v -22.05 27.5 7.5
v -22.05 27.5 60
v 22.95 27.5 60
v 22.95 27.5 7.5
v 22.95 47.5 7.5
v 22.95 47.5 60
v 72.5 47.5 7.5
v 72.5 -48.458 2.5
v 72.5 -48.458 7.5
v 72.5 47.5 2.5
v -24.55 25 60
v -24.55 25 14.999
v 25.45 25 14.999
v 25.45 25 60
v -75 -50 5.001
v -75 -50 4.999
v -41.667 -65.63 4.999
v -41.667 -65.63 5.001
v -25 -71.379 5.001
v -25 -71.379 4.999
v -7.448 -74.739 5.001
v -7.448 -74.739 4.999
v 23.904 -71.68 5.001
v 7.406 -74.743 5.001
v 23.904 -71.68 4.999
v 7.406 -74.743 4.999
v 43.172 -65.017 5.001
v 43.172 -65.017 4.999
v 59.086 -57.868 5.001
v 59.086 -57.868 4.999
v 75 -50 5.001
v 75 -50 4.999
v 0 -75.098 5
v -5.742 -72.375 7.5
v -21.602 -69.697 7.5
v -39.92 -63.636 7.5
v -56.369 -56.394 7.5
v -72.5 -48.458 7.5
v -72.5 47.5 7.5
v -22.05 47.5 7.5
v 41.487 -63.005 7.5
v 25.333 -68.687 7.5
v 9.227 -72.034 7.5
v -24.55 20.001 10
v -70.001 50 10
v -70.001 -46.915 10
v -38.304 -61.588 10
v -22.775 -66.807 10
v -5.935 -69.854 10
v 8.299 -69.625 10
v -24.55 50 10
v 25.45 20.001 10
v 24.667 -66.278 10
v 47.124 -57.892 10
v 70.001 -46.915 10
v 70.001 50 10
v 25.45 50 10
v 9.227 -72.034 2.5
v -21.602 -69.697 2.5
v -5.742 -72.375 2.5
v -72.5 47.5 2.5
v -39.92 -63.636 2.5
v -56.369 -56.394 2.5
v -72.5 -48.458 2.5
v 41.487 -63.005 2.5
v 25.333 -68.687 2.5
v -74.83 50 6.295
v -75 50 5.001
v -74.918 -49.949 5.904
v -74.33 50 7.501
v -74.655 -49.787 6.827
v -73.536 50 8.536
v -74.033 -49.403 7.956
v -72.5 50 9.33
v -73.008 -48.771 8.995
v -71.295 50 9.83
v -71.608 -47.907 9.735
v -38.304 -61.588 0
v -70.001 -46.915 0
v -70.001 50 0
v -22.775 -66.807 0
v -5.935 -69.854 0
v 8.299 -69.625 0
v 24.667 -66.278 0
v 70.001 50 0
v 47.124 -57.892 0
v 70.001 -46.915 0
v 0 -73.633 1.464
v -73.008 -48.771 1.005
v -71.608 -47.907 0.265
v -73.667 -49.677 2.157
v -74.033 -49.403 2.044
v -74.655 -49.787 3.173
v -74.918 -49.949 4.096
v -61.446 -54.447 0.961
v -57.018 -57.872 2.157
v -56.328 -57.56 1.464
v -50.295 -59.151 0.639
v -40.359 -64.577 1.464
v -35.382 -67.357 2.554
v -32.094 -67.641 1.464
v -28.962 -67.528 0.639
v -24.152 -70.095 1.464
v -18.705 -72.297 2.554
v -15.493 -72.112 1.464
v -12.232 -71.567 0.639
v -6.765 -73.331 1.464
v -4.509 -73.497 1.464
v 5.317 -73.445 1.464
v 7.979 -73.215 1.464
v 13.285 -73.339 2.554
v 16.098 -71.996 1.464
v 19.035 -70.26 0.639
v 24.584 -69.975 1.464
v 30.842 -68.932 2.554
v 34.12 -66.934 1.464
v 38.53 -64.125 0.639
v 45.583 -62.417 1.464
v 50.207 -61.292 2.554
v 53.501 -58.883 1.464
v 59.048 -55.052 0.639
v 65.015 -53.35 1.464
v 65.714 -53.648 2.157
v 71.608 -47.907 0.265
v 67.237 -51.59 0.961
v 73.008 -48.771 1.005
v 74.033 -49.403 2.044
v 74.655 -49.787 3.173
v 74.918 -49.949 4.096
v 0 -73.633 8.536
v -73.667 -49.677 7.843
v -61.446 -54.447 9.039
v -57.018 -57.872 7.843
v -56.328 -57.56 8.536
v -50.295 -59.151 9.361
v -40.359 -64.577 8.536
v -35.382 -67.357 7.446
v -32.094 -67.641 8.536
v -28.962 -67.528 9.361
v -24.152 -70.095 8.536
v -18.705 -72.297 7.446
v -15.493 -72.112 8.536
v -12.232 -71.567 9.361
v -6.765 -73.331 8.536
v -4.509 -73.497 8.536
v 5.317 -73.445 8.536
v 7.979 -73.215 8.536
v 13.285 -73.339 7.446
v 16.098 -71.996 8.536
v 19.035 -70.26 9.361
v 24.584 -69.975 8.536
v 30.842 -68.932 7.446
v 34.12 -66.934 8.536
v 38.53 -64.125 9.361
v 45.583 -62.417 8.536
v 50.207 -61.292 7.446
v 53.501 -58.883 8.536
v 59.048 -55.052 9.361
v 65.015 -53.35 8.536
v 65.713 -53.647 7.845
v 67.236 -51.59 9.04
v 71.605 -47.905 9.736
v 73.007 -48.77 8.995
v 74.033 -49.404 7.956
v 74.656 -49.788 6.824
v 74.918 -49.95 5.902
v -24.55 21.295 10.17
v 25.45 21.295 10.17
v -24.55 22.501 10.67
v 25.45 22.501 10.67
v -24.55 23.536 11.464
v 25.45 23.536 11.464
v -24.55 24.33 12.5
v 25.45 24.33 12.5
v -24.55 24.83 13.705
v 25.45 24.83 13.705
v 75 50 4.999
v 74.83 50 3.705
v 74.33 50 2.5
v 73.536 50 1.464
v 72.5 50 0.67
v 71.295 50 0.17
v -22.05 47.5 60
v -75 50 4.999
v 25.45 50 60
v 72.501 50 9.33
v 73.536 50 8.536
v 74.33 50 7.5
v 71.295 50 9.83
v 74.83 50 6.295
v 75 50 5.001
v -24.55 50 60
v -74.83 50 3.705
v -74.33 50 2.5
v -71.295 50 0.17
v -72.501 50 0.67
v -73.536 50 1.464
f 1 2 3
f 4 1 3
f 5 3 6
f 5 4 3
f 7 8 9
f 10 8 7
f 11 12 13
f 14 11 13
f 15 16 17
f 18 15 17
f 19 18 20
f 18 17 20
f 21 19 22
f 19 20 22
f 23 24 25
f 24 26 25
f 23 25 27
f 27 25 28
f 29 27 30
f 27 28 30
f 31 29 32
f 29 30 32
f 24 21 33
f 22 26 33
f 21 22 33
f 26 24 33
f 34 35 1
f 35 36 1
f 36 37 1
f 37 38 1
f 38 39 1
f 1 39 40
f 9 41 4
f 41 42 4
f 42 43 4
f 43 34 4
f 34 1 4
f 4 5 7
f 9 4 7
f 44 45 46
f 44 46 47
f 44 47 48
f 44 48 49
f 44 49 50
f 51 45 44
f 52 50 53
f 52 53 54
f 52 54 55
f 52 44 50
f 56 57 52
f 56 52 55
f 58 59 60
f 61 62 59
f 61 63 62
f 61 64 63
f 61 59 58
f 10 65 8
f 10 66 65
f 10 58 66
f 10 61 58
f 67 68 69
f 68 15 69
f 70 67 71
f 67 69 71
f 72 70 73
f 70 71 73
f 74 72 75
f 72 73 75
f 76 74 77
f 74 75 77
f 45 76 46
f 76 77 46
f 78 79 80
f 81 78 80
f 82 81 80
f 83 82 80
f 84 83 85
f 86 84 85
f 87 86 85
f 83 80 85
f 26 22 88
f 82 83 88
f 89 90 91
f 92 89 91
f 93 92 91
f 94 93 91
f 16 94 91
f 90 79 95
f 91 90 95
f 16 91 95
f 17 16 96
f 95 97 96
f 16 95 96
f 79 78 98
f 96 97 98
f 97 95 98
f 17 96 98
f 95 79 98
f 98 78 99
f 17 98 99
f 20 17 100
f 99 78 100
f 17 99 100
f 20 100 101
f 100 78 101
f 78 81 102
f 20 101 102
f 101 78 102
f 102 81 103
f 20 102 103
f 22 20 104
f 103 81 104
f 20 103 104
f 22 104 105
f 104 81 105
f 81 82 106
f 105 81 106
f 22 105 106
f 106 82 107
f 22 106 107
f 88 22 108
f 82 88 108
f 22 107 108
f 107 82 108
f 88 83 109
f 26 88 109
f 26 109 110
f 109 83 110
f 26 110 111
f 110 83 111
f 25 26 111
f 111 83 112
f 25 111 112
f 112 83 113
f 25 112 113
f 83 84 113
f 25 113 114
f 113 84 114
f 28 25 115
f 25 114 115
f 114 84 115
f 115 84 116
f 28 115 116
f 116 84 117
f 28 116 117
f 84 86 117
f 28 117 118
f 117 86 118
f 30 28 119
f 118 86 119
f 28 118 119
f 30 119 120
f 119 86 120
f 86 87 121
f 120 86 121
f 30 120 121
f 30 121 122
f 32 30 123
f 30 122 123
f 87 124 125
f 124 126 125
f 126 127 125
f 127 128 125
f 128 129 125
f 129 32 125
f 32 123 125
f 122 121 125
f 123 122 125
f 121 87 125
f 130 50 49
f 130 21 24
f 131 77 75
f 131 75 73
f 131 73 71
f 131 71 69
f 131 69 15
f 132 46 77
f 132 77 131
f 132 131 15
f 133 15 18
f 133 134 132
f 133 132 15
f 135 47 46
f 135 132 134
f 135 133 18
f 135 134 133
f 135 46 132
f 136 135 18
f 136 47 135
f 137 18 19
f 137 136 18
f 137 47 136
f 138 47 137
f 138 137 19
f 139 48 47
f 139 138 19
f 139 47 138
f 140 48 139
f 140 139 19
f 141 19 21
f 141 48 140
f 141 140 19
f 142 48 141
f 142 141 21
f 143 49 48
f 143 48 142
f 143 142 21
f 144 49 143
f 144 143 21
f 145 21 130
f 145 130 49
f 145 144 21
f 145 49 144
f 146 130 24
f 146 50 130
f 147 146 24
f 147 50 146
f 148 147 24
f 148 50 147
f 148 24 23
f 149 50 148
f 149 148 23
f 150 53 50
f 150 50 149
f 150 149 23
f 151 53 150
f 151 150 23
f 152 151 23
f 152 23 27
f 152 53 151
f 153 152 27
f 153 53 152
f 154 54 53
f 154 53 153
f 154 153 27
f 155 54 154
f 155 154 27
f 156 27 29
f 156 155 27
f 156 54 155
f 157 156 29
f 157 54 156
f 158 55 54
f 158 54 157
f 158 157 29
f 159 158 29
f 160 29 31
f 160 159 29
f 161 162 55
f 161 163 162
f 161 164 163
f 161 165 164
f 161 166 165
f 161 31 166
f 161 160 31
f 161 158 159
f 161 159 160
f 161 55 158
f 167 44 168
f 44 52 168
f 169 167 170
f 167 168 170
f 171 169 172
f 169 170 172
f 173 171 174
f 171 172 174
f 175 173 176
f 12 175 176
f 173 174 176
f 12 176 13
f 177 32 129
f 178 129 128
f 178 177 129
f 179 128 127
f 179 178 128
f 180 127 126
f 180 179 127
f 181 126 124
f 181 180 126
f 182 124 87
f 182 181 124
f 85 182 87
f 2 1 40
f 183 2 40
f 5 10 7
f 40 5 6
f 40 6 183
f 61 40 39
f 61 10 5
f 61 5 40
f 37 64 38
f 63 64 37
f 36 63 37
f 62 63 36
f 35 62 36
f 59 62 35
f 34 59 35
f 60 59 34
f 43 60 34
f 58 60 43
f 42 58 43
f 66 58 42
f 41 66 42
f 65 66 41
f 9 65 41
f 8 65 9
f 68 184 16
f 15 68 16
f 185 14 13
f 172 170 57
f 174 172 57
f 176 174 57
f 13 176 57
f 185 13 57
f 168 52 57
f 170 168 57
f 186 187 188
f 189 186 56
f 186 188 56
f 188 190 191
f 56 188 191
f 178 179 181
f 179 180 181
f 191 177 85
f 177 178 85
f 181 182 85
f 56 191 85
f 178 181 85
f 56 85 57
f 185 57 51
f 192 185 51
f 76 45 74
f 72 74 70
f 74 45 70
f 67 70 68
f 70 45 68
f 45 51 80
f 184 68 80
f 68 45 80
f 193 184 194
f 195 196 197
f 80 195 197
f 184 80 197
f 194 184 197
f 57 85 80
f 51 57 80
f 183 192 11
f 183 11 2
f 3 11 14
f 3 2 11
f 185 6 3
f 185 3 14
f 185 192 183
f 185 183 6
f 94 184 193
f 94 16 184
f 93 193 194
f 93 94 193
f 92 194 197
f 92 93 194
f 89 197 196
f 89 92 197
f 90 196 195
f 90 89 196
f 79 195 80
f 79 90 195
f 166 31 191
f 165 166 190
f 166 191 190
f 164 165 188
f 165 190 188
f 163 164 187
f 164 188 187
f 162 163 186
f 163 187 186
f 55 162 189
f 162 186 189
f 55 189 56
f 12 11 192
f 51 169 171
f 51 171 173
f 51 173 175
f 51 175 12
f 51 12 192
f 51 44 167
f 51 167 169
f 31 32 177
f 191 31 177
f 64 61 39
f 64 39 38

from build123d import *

# Parameters (mm, degrees)
F1_DEPTH = 10
F2_W     = 50
F2_H     = 25
F3_DEPTH = 50
F4_T     = -2.5
F5_R     = 4.999


# Not quite as in the source:
# - a fillet or chamfer is up to 0.001 mm smaller than in the source, because OpenCascade refuses the exact size


with BuildPart() as f1:
    # F0 (on Top) → F1 (new body)
    with BuildSketch(Plane.XY):
        with BuildLine():
            Line((75, 50), (-75, 50))
            Line((-75, 50), (-75, -50))
            add(Edge.make_bspline(
                [(-75, -50), (-50, -62.5487543643), (0, -87.6462630928), (50, -62.5487543643), (75, -50)],
                knots=[0, 0, 0, 0, 0.5, 1, 1, 1, 1], degree=3))
            Line((75, -50), (75, 50))
        make_face()
    extrude(amount=F1_DEPTH)

    # F2 (on face) → F3 (join)
    with BuildSketch(Plane.XY.offset(10)):
        with Locations((0.4496160895, 37.5)):
            Rectangle(F2_W, F2_H)
    extrude(amount=F3_DEPTH)

    # F4
    f4_openings = [f1.faces().sort_by_distance(p)[0] for p in [
        (0.449616, 37.5, 60),
    ]]
    offset(amount=F4_T, openings=f4_openings, kind=Kind.INTERSECTION)

    # F5 (radius 5 in the source; OpenCascade refuses exactly that, so slightly less here)
    f5_edges = [f1.edges().sort_by_distance(p)[0] for p in [
        (0, -75.097509, 10),
        (0, -75.097509, 0),
        (-75, 0, 10),
        (-75, 0, 0),
        (75, 0, 0),
        (75, 0, 10),
        (0.449616, 25, 10),
    ]]
    fillet(f5_edges, radius=F5_R)


solid = f1.part
